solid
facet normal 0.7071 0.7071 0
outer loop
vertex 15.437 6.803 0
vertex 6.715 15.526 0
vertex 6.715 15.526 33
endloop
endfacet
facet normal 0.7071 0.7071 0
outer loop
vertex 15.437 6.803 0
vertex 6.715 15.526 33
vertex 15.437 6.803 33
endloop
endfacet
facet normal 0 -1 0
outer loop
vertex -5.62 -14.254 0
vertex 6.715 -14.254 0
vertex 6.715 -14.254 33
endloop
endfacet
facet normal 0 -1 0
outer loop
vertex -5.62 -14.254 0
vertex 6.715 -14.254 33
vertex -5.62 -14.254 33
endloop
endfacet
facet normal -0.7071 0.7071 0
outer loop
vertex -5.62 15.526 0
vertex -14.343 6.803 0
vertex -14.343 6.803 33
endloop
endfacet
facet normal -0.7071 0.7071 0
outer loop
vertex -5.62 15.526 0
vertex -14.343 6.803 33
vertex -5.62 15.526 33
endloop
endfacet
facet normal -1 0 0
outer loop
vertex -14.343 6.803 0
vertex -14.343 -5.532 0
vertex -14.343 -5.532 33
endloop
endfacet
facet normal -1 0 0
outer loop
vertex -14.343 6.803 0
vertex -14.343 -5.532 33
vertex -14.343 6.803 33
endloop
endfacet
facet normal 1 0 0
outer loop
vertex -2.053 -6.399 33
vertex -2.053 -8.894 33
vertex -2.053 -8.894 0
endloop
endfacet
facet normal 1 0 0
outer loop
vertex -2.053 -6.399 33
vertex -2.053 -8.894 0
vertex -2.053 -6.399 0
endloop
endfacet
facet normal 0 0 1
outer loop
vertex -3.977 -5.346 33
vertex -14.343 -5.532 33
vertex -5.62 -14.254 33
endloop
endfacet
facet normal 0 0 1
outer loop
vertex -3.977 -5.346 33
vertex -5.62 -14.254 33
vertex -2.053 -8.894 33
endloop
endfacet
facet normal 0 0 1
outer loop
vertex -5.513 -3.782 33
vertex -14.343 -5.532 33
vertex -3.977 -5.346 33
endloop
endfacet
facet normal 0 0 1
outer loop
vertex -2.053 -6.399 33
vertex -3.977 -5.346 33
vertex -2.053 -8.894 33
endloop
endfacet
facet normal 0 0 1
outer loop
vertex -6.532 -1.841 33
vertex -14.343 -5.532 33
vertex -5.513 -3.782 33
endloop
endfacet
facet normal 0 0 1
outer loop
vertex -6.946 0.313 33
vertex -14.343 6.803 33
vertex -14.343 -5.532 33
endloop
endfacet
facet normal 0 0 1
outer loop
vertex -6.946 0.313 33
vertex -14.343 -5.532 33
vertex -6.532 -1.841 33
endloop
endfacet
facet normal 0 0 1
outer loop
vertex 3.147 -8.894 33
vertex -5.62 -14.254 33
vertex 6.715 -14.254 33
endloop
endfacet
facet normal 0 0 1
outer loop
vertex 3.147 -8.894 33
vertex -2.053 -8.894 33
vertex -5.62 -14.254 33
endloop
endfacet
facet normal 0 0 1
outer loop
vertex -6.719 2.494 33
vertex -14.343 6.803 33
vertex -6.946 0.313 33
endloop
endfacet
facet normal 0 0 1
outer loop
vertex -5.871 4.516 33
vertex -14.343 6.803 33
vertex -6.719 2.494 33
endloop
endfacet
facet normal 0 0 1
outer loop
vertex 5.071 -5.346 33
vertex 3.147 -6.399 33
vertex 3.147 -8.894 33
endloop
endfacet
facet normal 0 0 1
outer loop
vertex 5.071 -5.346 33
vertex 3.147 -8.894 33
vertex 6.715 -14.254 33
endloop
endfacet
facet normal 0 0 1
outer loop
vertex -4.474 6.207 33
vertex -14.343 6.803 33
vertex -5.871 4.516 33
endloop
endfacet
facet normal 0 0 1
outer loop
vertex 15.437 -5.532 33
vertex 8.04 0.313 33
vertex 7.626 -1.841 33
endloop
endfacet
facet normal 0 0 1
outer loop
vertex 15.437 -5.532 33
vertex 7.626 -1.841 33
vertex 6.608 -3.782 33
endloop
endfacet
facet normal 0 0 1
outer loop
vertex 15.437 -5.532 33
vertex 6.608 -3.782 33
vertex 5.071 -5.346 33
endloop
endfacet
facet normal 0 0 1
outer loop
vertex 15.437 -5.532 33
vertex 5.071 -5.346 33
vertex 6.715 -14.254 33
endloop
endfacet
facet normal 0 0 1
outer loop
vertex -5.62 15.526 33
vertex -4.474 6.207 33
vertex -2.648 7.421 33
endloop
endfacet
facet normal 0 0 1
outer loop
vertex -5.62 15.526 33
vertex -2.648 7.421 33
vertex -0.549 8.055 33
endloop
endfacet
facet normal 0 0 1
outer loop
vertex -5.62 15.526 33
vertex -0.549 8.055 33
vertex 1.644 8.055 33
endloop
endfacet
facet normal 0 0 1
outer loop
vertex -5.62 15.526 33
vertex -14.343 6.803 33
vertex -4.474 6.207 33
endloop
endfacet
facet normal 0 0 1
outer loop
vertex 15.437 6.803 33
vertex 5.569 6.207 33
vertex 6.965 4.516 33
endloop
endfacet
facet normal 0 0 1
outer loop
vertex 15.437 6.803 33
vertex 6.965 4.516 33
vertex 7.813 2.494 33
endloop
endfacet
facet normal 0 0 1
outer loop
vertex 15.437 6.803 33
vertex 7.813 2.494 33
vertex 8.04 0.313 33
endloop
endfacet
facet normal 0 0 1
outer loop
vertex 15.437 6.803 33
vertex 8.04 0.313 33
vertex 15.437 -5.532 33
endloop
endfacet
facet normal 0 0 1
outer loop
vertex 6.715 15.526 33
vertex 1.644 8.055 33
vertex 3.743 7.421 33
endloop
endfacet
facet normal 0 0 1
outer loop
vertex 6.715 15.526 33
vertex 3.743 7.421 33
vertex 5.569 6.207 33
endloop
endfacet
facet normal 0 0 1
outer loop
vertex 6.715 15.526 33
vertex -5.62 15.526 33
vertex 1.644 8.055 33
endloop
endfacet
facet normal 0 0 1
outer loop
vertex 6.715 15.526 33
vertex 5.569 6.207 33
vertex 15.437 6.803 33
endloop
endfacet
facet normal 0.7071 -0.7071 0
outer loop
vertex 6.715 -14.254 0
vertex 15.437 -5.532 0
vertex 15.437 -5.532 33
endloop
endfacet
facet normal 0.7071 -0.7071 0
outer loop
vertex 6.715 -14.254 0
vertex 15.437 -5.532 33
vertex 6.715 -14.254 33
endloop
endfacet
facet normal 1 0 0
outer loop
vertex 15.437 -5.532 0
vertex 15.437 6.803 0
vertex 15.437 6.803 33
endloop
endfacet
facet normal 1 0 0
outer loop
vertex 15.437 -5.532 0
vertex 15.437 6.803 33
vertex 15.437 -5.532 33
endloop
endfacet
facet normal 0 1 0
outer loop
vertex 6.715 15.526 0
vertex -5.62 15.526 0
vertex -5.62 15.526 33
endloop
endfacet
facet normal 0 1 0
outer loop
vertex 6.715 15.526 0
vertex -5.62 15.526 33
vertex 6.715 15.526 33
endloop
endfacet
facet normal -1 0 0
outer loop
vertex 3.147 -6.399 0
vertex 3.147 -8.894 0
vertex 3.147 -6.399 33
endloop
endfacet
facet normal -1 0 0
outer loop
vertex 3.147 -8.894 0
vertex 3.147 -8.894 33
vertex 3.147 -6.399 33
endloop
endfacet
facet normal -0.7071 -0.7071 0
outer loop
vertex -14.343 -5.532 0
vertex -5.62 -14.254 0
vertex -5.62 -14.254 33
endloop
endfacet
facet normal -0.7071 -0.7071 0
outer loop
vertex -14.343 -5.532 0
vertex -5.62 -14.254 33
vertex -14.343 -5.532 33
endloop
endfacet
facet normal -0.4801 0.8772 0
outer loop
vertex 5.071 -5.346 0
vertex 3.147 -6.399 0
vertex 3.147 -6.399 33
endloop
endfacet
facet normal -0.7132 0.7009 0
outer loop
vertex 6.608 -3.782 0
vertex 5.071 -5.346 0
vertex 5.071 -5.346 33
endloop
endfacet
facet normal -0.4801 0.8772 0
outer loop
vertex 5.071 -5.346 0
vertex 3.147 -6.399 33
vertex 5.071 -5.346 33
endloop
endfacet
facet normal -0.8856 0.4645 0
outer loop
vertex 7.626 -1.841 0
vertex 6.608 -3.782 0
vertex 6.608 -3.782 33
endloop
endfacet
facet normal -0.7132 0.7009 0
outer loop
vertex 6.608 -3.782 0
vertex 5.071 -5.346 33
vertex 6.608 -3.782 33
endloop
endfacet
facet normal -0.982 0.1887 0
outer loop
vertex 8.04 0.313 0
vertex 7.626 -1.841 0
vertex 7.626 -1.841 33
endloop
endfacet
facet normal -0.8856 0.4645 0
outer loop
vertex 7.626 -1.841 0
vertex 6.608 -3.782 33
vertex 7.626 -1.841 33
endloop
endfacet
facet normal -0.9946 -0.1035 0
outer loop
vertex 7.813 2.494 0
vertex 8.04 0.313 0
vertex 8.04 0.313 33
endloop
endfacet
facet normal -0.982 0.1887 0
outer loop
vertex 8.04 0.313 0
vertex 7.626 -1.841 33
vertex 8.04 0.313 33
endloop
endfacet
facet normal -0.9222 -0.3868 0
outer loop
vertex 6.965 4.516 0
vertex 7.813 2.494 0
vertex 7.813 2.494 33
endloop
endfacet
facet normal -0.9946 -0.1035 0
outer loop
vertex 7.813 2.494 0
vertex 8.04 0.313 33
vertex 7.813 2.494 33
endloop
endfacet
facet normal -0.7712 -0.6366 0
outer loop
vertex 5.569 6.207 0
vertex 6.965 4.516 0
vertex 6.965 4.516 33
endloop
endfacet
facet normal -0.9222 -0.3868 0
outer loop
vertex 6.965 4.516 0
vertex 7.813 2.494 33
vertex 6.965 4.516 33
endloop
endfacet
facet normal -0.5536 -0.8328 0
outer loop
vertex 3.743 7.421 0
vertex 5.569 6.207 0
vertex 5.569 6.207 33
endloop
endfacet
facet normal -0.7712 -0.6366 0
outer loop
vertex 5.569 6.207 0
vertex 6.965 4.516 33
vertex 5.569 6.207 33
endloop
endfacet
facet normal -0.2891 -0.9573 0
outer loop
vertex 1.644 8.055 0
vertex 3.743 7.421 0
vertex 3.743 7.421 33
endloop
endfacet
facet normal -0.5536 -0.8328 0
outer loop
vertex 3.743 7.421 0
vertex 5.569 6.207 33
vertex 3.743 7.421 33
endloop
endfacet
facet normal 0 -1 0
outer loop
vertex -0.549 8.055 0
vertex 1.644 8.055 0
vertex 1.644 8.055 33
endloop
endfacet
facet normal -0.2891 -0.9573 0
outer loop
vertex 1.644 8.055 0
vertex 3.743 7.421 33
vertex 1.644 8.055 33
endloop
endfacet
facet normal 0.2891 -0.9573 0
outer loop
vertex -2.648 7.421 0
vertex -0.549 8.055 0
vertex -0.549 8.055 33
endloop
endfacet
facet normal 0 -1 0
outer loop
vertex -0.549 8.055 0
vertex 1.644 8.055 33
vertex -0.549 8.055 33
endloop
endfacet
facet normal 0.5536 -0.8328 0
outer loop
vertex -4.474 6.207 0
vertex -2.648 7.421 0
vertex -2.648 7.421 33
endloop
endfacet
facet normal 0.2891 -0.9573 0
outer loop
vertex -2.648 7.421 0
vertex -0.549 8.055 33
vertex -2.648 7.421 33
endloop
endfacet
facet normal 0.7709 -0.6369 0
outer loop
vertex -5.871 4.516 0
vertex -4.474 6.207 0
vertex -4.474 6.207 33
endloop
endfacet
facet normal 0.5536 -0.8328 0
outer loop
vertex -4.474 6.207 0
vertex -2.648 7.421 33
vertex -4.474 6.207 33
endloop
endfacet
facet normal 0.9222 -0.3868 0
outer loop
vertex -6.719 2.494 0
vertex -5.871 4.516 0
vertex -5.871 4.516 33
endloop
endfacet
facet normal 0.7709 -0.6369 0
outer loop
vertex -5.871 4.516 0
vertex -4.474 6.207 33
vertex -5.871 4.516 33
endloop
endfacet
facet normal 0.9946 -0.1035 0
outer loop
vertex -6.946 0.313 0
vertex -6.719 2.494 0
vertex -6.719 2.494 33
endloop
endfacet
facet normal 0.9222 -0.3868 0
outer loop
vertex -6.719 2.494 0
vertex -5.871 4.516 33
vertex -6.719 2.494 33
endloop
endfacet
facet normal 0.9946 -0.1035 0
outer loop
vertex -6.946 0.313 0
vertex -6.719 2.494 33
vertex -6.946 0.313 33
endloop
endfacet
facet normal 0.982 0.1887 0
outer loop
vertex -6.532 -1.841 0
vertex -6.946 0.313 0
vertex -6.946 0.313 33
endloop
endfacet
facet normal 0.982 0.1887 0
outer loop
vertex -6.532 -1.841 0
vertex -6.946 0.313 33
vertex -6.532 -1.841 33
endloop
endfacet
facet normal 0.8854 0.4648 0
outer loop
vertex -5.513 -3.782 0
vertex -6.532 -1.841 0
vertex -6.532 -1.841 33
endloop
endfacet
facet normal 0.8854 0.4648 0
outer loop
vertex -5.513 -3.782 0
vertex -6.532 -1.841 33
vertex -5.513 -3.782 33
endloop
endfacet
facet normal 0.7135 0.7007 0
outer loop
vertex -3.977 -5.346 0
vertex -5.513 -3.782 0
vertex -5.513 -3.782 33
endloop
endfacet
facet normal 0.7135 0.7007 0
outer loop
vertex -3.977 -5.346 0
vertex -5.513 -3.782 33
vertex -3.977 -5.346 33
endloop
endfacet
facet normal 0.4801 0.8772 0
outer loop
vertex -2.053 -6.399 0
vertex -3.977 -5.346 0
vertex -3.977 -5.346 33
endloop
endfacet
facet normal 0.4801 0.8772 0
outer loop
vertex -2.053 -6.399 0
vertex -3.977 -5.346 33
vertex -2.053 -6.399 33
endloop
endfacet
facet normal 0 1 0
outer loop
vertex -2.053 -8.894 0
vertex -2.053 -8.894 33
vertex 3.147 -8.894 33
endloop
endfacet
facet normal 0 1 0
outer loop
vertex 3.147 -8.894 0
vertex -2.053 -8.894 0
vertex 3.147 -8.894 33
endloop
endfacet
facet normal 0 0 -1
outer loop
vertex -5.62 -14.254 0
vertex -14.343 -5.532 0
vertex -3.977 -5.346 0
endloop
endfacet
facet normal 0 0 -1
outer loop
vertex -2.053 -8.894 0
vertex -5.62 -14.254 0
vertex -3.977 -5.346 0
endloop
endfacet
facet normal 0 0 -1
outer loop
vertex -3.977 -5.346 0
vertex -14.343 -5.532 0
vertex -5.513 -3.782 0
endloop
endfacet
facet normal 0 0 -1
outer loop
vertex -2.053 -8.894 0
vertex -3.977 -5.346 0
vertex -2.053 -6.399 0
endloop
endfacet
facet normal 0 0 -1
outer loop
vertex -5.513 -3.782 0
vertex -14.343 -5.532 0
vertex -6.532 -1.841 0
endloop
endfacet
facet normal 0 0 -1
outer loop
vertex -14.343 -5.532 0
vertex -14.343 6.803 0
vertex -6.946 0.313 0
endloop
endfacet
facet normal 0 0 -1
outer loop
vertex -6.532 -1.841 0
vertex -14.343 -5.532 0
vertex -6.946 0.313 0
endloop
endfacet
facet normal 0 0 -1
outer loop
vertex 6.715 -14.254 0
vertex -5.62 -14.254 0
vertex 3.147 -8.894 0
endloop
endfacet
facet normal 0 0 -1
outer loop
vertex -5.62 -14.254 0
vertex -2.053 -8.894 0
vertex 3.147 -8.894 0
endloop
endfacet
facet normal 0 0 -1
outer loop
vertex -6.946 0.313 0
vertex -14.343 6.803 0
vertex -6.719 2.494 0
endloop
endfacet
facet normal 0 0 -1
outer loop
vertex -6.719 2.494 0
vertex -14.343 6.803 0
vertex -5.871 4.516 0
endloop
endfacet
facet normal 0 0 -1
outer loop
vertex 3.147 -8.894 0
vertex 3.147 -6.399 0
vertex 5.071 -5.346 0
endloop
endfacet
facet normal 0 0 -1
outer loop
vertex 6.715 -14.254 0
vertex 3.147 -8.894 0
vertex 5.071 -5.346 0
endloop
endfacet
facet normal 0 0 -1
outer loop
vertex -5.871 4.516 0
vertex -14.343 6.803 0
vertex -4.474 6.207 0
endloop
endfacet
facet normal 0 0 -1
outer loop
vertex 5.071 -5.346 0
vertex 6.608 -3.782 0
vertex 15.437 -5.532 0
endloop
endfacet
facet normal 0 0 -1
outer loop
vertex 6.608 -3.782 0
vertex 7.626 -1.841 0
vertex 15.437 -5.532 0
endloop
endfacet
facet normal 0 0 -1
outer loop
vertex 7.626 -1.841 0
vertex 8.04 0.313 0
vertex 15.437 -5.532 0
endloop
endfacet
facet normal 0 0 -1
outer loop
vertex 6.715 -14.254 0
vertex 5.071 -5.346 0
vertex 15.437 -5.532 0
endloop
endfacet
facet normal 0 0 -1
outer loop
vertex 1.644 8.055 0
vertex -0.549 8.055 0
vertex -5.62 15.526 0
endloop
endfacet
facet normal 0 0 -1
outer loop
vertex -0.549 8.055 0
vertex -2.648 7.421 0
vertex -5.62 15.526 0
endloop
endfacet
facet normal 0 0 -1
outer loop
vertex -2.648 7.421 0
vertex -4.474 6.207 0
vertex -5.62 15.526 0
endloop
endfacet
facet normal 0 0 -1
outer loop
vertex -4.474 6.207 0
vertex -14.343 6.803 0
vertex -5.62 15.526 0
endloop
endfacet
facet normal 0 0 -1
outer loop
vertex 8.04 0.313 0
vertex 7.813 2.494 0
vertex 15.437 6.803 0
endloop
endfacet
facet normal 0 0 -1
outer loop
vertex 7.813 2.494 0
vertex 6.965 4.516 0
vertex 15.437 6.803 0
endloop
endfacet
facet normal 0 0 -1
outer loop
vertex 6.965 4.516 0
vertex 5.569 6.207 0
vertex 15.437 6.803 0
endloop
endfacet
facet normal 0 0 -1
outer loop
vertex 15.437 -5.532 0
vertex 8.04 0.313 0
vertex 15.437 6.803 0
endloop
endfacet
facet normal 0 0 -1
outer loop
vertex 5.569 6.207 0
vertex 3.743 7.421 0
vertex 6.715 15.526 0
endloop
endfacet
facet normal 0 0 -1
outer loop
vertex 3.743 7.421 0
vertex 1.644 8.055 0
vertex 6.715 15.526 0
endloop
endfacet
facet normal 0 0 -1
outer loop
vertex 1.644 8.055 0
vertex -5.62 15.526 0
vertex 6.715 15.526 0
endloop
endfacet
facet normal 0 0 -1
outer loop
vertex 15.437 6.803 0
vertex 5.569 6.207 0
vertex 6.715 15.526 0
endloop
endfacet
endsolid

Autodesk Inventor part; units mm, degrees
ref_plane "YZ Plane" through (0, 0, 0) normal (1, 0, 0) x (0, 1, 0)
ref_plane "XZ Plane" through (0, 0, 0) normal (0, 1, 0) x (-1, 0, 0)
ref_plane "XY Plane" through (0, 0, 0) normal (0, 0, 1) x (1, 0, 0)
sketch "Sketch1" plane through (0, 0, 0) normal (0, 0, 1) x (1, 0, 0)
  circle A0 centre (-19.4529, 0.6357) radius 3.1
  circle A1 centre (0.5471, -19.3643) radius 3.1
  circle A2 centre (20.5471, 0.6357) radius 3.1
  circle A3 centre (-13.595, 14.7778) radius 3.1
  line L0 (15.4871, -5.5527) -> (6.7355, -14.3043)
  line L1 (6.7355, -14.3043) -> (-5.6412, -14.3043)
  line L2 (-5.6412, -14.3043) -> (-14.3929, -5.5527)
  line L3 (-14.3929, -5.5527) -> (-14.3929, 6.824)
  line L4 (-14.3929, 6.824) -> (-5.6412, 15.5757)
  line L5 (-5.6412, 15.5757) -> (6.7355, 15.5757)
  line L6 (6.7355, 15.5757) -> (15.4871, 6.824)
  line L7 (15.4871, 6.824) -> (15.4871, -5.5527)
  circle A4 centre (14.6893, 14.7778) radius 3.1
  circle A5 centre (14.6893, -13.5064) radius 3.1
  circle A6 centre (-13.595, -13.5064) radius 3.1
  arc A7 (-10.3042, 22.9357) -> (11.3984, 22.9357) centre (0.5471, 0.6357) ccw
  line L8 (-10.3042, 22.9357) -> (11.3984, 22.9357)
  point P0 (0, 0)
extrude "Extrusion1" add sketch "Sketch1" along normal blind 33 contours L0 L1 L2 L3 L4 L5 L6 L7
sketch "Sketch2" plane through (0, 0, 33) normal (0, 0, 1) x (1, 0, 0)
  arc A0 (3.1471, -6.3992) -> (-2.0529, -6.3992) centre (0.5471, 0.6357) ccw
  line L0 (3.1471, -8.8943) -> (3.1471, -6.3992)
  line L1 (-2.0529, -8.8943) -> (3.1471, -8.8943)
  line L2 (-2.0529, -8.8943) -> (-2.0529, -6.3992)
  line L3 (0.5471, 0.6357) -> (-14.3929, 0.6357)
  line L4 (-14.3929, 6.824) -> (-14.3929, -5.5527) projected
  line L5 (0.5471, 0.6357) -> (15.4871, 0.6357)
  line L6 (15.4871, -5.5527) -> (15.4871, 6.824) projected
  line L7 (0.5471, 0.6357) -> (0.5471, 15.5757)
  line L8 (6.7355, 15.5757) -> (-5.6412, 15.5757) projected
  point P0 (0, 0)
  point P1 (0.5471, 0.6357)
  point P2 (1.7246, 0.9714)
  dimension "d2" = 7.5
  dimension "d3" = 5.2
  dimension "d4" = 2.4951
  dimension "d5" = 2.6
extrude "Extrusion2" cut sketch "Sketch2" against normal through all
thicken "Thicken1" operation cut thickness 0.05 both sides no extend neighbours no toward (0, -1, 0) faces at (2.6099, 15.5757, 11) (12.5699, 9.7413, 22) (15.4871, -1.4271, 11) (9.6527, -11.3871, 11) (-1.5157, -14.3043, 11) (-11.4757, -8.4699, 11) (-14.3929, 2.6985, 11) (-8.5585, 12.6585, 11)
sketch "Sketch3" plane through (0, 0, 33) normal (0, 0, 1) x (1, 0, 0)
  line L0 (6.7148, -14.2543) -> (15.4371, -5.5319) projected
  line L1 (15.4371, -5.5319) -> (15.4371, 6.8033) projected
  line L2 (15.4371, 6.8033) -> (6.7148, 15.5257) projected
  line L3 (6.7148, 15.5257) -> (-5.6205, 15.5257) projected
  line L4 (-5.6205, 15.5257) -> (-14.3429, 6.8033) projected
  line L5 (-14.3429, 6.8033) -> (-14.3429, -5.5319) projected
  line L6 (-14.3429, -5.5319) -> (-5.6205, -14.2543) projected
  line L7 (-5.6205, -14.2543) -> (6.7148, -14.2543) projected
  line L8 (-2.0529, -8.8943) -> (-2.0529, -6.3992) projected
  arc A0 (3.1471, -6.3992) -> (-2.0529, -6.3992) centre (0.5471, 0.6357) ccw projected
  line L9 (3.1471, -6.3992) -> (3.1471, -8.8943) projected
  line L10 (3.1471, -8.8943) -> (-2.0529, -8.8943) projected
  point P0 (0, 0)
properties part number "spool_keyway"
